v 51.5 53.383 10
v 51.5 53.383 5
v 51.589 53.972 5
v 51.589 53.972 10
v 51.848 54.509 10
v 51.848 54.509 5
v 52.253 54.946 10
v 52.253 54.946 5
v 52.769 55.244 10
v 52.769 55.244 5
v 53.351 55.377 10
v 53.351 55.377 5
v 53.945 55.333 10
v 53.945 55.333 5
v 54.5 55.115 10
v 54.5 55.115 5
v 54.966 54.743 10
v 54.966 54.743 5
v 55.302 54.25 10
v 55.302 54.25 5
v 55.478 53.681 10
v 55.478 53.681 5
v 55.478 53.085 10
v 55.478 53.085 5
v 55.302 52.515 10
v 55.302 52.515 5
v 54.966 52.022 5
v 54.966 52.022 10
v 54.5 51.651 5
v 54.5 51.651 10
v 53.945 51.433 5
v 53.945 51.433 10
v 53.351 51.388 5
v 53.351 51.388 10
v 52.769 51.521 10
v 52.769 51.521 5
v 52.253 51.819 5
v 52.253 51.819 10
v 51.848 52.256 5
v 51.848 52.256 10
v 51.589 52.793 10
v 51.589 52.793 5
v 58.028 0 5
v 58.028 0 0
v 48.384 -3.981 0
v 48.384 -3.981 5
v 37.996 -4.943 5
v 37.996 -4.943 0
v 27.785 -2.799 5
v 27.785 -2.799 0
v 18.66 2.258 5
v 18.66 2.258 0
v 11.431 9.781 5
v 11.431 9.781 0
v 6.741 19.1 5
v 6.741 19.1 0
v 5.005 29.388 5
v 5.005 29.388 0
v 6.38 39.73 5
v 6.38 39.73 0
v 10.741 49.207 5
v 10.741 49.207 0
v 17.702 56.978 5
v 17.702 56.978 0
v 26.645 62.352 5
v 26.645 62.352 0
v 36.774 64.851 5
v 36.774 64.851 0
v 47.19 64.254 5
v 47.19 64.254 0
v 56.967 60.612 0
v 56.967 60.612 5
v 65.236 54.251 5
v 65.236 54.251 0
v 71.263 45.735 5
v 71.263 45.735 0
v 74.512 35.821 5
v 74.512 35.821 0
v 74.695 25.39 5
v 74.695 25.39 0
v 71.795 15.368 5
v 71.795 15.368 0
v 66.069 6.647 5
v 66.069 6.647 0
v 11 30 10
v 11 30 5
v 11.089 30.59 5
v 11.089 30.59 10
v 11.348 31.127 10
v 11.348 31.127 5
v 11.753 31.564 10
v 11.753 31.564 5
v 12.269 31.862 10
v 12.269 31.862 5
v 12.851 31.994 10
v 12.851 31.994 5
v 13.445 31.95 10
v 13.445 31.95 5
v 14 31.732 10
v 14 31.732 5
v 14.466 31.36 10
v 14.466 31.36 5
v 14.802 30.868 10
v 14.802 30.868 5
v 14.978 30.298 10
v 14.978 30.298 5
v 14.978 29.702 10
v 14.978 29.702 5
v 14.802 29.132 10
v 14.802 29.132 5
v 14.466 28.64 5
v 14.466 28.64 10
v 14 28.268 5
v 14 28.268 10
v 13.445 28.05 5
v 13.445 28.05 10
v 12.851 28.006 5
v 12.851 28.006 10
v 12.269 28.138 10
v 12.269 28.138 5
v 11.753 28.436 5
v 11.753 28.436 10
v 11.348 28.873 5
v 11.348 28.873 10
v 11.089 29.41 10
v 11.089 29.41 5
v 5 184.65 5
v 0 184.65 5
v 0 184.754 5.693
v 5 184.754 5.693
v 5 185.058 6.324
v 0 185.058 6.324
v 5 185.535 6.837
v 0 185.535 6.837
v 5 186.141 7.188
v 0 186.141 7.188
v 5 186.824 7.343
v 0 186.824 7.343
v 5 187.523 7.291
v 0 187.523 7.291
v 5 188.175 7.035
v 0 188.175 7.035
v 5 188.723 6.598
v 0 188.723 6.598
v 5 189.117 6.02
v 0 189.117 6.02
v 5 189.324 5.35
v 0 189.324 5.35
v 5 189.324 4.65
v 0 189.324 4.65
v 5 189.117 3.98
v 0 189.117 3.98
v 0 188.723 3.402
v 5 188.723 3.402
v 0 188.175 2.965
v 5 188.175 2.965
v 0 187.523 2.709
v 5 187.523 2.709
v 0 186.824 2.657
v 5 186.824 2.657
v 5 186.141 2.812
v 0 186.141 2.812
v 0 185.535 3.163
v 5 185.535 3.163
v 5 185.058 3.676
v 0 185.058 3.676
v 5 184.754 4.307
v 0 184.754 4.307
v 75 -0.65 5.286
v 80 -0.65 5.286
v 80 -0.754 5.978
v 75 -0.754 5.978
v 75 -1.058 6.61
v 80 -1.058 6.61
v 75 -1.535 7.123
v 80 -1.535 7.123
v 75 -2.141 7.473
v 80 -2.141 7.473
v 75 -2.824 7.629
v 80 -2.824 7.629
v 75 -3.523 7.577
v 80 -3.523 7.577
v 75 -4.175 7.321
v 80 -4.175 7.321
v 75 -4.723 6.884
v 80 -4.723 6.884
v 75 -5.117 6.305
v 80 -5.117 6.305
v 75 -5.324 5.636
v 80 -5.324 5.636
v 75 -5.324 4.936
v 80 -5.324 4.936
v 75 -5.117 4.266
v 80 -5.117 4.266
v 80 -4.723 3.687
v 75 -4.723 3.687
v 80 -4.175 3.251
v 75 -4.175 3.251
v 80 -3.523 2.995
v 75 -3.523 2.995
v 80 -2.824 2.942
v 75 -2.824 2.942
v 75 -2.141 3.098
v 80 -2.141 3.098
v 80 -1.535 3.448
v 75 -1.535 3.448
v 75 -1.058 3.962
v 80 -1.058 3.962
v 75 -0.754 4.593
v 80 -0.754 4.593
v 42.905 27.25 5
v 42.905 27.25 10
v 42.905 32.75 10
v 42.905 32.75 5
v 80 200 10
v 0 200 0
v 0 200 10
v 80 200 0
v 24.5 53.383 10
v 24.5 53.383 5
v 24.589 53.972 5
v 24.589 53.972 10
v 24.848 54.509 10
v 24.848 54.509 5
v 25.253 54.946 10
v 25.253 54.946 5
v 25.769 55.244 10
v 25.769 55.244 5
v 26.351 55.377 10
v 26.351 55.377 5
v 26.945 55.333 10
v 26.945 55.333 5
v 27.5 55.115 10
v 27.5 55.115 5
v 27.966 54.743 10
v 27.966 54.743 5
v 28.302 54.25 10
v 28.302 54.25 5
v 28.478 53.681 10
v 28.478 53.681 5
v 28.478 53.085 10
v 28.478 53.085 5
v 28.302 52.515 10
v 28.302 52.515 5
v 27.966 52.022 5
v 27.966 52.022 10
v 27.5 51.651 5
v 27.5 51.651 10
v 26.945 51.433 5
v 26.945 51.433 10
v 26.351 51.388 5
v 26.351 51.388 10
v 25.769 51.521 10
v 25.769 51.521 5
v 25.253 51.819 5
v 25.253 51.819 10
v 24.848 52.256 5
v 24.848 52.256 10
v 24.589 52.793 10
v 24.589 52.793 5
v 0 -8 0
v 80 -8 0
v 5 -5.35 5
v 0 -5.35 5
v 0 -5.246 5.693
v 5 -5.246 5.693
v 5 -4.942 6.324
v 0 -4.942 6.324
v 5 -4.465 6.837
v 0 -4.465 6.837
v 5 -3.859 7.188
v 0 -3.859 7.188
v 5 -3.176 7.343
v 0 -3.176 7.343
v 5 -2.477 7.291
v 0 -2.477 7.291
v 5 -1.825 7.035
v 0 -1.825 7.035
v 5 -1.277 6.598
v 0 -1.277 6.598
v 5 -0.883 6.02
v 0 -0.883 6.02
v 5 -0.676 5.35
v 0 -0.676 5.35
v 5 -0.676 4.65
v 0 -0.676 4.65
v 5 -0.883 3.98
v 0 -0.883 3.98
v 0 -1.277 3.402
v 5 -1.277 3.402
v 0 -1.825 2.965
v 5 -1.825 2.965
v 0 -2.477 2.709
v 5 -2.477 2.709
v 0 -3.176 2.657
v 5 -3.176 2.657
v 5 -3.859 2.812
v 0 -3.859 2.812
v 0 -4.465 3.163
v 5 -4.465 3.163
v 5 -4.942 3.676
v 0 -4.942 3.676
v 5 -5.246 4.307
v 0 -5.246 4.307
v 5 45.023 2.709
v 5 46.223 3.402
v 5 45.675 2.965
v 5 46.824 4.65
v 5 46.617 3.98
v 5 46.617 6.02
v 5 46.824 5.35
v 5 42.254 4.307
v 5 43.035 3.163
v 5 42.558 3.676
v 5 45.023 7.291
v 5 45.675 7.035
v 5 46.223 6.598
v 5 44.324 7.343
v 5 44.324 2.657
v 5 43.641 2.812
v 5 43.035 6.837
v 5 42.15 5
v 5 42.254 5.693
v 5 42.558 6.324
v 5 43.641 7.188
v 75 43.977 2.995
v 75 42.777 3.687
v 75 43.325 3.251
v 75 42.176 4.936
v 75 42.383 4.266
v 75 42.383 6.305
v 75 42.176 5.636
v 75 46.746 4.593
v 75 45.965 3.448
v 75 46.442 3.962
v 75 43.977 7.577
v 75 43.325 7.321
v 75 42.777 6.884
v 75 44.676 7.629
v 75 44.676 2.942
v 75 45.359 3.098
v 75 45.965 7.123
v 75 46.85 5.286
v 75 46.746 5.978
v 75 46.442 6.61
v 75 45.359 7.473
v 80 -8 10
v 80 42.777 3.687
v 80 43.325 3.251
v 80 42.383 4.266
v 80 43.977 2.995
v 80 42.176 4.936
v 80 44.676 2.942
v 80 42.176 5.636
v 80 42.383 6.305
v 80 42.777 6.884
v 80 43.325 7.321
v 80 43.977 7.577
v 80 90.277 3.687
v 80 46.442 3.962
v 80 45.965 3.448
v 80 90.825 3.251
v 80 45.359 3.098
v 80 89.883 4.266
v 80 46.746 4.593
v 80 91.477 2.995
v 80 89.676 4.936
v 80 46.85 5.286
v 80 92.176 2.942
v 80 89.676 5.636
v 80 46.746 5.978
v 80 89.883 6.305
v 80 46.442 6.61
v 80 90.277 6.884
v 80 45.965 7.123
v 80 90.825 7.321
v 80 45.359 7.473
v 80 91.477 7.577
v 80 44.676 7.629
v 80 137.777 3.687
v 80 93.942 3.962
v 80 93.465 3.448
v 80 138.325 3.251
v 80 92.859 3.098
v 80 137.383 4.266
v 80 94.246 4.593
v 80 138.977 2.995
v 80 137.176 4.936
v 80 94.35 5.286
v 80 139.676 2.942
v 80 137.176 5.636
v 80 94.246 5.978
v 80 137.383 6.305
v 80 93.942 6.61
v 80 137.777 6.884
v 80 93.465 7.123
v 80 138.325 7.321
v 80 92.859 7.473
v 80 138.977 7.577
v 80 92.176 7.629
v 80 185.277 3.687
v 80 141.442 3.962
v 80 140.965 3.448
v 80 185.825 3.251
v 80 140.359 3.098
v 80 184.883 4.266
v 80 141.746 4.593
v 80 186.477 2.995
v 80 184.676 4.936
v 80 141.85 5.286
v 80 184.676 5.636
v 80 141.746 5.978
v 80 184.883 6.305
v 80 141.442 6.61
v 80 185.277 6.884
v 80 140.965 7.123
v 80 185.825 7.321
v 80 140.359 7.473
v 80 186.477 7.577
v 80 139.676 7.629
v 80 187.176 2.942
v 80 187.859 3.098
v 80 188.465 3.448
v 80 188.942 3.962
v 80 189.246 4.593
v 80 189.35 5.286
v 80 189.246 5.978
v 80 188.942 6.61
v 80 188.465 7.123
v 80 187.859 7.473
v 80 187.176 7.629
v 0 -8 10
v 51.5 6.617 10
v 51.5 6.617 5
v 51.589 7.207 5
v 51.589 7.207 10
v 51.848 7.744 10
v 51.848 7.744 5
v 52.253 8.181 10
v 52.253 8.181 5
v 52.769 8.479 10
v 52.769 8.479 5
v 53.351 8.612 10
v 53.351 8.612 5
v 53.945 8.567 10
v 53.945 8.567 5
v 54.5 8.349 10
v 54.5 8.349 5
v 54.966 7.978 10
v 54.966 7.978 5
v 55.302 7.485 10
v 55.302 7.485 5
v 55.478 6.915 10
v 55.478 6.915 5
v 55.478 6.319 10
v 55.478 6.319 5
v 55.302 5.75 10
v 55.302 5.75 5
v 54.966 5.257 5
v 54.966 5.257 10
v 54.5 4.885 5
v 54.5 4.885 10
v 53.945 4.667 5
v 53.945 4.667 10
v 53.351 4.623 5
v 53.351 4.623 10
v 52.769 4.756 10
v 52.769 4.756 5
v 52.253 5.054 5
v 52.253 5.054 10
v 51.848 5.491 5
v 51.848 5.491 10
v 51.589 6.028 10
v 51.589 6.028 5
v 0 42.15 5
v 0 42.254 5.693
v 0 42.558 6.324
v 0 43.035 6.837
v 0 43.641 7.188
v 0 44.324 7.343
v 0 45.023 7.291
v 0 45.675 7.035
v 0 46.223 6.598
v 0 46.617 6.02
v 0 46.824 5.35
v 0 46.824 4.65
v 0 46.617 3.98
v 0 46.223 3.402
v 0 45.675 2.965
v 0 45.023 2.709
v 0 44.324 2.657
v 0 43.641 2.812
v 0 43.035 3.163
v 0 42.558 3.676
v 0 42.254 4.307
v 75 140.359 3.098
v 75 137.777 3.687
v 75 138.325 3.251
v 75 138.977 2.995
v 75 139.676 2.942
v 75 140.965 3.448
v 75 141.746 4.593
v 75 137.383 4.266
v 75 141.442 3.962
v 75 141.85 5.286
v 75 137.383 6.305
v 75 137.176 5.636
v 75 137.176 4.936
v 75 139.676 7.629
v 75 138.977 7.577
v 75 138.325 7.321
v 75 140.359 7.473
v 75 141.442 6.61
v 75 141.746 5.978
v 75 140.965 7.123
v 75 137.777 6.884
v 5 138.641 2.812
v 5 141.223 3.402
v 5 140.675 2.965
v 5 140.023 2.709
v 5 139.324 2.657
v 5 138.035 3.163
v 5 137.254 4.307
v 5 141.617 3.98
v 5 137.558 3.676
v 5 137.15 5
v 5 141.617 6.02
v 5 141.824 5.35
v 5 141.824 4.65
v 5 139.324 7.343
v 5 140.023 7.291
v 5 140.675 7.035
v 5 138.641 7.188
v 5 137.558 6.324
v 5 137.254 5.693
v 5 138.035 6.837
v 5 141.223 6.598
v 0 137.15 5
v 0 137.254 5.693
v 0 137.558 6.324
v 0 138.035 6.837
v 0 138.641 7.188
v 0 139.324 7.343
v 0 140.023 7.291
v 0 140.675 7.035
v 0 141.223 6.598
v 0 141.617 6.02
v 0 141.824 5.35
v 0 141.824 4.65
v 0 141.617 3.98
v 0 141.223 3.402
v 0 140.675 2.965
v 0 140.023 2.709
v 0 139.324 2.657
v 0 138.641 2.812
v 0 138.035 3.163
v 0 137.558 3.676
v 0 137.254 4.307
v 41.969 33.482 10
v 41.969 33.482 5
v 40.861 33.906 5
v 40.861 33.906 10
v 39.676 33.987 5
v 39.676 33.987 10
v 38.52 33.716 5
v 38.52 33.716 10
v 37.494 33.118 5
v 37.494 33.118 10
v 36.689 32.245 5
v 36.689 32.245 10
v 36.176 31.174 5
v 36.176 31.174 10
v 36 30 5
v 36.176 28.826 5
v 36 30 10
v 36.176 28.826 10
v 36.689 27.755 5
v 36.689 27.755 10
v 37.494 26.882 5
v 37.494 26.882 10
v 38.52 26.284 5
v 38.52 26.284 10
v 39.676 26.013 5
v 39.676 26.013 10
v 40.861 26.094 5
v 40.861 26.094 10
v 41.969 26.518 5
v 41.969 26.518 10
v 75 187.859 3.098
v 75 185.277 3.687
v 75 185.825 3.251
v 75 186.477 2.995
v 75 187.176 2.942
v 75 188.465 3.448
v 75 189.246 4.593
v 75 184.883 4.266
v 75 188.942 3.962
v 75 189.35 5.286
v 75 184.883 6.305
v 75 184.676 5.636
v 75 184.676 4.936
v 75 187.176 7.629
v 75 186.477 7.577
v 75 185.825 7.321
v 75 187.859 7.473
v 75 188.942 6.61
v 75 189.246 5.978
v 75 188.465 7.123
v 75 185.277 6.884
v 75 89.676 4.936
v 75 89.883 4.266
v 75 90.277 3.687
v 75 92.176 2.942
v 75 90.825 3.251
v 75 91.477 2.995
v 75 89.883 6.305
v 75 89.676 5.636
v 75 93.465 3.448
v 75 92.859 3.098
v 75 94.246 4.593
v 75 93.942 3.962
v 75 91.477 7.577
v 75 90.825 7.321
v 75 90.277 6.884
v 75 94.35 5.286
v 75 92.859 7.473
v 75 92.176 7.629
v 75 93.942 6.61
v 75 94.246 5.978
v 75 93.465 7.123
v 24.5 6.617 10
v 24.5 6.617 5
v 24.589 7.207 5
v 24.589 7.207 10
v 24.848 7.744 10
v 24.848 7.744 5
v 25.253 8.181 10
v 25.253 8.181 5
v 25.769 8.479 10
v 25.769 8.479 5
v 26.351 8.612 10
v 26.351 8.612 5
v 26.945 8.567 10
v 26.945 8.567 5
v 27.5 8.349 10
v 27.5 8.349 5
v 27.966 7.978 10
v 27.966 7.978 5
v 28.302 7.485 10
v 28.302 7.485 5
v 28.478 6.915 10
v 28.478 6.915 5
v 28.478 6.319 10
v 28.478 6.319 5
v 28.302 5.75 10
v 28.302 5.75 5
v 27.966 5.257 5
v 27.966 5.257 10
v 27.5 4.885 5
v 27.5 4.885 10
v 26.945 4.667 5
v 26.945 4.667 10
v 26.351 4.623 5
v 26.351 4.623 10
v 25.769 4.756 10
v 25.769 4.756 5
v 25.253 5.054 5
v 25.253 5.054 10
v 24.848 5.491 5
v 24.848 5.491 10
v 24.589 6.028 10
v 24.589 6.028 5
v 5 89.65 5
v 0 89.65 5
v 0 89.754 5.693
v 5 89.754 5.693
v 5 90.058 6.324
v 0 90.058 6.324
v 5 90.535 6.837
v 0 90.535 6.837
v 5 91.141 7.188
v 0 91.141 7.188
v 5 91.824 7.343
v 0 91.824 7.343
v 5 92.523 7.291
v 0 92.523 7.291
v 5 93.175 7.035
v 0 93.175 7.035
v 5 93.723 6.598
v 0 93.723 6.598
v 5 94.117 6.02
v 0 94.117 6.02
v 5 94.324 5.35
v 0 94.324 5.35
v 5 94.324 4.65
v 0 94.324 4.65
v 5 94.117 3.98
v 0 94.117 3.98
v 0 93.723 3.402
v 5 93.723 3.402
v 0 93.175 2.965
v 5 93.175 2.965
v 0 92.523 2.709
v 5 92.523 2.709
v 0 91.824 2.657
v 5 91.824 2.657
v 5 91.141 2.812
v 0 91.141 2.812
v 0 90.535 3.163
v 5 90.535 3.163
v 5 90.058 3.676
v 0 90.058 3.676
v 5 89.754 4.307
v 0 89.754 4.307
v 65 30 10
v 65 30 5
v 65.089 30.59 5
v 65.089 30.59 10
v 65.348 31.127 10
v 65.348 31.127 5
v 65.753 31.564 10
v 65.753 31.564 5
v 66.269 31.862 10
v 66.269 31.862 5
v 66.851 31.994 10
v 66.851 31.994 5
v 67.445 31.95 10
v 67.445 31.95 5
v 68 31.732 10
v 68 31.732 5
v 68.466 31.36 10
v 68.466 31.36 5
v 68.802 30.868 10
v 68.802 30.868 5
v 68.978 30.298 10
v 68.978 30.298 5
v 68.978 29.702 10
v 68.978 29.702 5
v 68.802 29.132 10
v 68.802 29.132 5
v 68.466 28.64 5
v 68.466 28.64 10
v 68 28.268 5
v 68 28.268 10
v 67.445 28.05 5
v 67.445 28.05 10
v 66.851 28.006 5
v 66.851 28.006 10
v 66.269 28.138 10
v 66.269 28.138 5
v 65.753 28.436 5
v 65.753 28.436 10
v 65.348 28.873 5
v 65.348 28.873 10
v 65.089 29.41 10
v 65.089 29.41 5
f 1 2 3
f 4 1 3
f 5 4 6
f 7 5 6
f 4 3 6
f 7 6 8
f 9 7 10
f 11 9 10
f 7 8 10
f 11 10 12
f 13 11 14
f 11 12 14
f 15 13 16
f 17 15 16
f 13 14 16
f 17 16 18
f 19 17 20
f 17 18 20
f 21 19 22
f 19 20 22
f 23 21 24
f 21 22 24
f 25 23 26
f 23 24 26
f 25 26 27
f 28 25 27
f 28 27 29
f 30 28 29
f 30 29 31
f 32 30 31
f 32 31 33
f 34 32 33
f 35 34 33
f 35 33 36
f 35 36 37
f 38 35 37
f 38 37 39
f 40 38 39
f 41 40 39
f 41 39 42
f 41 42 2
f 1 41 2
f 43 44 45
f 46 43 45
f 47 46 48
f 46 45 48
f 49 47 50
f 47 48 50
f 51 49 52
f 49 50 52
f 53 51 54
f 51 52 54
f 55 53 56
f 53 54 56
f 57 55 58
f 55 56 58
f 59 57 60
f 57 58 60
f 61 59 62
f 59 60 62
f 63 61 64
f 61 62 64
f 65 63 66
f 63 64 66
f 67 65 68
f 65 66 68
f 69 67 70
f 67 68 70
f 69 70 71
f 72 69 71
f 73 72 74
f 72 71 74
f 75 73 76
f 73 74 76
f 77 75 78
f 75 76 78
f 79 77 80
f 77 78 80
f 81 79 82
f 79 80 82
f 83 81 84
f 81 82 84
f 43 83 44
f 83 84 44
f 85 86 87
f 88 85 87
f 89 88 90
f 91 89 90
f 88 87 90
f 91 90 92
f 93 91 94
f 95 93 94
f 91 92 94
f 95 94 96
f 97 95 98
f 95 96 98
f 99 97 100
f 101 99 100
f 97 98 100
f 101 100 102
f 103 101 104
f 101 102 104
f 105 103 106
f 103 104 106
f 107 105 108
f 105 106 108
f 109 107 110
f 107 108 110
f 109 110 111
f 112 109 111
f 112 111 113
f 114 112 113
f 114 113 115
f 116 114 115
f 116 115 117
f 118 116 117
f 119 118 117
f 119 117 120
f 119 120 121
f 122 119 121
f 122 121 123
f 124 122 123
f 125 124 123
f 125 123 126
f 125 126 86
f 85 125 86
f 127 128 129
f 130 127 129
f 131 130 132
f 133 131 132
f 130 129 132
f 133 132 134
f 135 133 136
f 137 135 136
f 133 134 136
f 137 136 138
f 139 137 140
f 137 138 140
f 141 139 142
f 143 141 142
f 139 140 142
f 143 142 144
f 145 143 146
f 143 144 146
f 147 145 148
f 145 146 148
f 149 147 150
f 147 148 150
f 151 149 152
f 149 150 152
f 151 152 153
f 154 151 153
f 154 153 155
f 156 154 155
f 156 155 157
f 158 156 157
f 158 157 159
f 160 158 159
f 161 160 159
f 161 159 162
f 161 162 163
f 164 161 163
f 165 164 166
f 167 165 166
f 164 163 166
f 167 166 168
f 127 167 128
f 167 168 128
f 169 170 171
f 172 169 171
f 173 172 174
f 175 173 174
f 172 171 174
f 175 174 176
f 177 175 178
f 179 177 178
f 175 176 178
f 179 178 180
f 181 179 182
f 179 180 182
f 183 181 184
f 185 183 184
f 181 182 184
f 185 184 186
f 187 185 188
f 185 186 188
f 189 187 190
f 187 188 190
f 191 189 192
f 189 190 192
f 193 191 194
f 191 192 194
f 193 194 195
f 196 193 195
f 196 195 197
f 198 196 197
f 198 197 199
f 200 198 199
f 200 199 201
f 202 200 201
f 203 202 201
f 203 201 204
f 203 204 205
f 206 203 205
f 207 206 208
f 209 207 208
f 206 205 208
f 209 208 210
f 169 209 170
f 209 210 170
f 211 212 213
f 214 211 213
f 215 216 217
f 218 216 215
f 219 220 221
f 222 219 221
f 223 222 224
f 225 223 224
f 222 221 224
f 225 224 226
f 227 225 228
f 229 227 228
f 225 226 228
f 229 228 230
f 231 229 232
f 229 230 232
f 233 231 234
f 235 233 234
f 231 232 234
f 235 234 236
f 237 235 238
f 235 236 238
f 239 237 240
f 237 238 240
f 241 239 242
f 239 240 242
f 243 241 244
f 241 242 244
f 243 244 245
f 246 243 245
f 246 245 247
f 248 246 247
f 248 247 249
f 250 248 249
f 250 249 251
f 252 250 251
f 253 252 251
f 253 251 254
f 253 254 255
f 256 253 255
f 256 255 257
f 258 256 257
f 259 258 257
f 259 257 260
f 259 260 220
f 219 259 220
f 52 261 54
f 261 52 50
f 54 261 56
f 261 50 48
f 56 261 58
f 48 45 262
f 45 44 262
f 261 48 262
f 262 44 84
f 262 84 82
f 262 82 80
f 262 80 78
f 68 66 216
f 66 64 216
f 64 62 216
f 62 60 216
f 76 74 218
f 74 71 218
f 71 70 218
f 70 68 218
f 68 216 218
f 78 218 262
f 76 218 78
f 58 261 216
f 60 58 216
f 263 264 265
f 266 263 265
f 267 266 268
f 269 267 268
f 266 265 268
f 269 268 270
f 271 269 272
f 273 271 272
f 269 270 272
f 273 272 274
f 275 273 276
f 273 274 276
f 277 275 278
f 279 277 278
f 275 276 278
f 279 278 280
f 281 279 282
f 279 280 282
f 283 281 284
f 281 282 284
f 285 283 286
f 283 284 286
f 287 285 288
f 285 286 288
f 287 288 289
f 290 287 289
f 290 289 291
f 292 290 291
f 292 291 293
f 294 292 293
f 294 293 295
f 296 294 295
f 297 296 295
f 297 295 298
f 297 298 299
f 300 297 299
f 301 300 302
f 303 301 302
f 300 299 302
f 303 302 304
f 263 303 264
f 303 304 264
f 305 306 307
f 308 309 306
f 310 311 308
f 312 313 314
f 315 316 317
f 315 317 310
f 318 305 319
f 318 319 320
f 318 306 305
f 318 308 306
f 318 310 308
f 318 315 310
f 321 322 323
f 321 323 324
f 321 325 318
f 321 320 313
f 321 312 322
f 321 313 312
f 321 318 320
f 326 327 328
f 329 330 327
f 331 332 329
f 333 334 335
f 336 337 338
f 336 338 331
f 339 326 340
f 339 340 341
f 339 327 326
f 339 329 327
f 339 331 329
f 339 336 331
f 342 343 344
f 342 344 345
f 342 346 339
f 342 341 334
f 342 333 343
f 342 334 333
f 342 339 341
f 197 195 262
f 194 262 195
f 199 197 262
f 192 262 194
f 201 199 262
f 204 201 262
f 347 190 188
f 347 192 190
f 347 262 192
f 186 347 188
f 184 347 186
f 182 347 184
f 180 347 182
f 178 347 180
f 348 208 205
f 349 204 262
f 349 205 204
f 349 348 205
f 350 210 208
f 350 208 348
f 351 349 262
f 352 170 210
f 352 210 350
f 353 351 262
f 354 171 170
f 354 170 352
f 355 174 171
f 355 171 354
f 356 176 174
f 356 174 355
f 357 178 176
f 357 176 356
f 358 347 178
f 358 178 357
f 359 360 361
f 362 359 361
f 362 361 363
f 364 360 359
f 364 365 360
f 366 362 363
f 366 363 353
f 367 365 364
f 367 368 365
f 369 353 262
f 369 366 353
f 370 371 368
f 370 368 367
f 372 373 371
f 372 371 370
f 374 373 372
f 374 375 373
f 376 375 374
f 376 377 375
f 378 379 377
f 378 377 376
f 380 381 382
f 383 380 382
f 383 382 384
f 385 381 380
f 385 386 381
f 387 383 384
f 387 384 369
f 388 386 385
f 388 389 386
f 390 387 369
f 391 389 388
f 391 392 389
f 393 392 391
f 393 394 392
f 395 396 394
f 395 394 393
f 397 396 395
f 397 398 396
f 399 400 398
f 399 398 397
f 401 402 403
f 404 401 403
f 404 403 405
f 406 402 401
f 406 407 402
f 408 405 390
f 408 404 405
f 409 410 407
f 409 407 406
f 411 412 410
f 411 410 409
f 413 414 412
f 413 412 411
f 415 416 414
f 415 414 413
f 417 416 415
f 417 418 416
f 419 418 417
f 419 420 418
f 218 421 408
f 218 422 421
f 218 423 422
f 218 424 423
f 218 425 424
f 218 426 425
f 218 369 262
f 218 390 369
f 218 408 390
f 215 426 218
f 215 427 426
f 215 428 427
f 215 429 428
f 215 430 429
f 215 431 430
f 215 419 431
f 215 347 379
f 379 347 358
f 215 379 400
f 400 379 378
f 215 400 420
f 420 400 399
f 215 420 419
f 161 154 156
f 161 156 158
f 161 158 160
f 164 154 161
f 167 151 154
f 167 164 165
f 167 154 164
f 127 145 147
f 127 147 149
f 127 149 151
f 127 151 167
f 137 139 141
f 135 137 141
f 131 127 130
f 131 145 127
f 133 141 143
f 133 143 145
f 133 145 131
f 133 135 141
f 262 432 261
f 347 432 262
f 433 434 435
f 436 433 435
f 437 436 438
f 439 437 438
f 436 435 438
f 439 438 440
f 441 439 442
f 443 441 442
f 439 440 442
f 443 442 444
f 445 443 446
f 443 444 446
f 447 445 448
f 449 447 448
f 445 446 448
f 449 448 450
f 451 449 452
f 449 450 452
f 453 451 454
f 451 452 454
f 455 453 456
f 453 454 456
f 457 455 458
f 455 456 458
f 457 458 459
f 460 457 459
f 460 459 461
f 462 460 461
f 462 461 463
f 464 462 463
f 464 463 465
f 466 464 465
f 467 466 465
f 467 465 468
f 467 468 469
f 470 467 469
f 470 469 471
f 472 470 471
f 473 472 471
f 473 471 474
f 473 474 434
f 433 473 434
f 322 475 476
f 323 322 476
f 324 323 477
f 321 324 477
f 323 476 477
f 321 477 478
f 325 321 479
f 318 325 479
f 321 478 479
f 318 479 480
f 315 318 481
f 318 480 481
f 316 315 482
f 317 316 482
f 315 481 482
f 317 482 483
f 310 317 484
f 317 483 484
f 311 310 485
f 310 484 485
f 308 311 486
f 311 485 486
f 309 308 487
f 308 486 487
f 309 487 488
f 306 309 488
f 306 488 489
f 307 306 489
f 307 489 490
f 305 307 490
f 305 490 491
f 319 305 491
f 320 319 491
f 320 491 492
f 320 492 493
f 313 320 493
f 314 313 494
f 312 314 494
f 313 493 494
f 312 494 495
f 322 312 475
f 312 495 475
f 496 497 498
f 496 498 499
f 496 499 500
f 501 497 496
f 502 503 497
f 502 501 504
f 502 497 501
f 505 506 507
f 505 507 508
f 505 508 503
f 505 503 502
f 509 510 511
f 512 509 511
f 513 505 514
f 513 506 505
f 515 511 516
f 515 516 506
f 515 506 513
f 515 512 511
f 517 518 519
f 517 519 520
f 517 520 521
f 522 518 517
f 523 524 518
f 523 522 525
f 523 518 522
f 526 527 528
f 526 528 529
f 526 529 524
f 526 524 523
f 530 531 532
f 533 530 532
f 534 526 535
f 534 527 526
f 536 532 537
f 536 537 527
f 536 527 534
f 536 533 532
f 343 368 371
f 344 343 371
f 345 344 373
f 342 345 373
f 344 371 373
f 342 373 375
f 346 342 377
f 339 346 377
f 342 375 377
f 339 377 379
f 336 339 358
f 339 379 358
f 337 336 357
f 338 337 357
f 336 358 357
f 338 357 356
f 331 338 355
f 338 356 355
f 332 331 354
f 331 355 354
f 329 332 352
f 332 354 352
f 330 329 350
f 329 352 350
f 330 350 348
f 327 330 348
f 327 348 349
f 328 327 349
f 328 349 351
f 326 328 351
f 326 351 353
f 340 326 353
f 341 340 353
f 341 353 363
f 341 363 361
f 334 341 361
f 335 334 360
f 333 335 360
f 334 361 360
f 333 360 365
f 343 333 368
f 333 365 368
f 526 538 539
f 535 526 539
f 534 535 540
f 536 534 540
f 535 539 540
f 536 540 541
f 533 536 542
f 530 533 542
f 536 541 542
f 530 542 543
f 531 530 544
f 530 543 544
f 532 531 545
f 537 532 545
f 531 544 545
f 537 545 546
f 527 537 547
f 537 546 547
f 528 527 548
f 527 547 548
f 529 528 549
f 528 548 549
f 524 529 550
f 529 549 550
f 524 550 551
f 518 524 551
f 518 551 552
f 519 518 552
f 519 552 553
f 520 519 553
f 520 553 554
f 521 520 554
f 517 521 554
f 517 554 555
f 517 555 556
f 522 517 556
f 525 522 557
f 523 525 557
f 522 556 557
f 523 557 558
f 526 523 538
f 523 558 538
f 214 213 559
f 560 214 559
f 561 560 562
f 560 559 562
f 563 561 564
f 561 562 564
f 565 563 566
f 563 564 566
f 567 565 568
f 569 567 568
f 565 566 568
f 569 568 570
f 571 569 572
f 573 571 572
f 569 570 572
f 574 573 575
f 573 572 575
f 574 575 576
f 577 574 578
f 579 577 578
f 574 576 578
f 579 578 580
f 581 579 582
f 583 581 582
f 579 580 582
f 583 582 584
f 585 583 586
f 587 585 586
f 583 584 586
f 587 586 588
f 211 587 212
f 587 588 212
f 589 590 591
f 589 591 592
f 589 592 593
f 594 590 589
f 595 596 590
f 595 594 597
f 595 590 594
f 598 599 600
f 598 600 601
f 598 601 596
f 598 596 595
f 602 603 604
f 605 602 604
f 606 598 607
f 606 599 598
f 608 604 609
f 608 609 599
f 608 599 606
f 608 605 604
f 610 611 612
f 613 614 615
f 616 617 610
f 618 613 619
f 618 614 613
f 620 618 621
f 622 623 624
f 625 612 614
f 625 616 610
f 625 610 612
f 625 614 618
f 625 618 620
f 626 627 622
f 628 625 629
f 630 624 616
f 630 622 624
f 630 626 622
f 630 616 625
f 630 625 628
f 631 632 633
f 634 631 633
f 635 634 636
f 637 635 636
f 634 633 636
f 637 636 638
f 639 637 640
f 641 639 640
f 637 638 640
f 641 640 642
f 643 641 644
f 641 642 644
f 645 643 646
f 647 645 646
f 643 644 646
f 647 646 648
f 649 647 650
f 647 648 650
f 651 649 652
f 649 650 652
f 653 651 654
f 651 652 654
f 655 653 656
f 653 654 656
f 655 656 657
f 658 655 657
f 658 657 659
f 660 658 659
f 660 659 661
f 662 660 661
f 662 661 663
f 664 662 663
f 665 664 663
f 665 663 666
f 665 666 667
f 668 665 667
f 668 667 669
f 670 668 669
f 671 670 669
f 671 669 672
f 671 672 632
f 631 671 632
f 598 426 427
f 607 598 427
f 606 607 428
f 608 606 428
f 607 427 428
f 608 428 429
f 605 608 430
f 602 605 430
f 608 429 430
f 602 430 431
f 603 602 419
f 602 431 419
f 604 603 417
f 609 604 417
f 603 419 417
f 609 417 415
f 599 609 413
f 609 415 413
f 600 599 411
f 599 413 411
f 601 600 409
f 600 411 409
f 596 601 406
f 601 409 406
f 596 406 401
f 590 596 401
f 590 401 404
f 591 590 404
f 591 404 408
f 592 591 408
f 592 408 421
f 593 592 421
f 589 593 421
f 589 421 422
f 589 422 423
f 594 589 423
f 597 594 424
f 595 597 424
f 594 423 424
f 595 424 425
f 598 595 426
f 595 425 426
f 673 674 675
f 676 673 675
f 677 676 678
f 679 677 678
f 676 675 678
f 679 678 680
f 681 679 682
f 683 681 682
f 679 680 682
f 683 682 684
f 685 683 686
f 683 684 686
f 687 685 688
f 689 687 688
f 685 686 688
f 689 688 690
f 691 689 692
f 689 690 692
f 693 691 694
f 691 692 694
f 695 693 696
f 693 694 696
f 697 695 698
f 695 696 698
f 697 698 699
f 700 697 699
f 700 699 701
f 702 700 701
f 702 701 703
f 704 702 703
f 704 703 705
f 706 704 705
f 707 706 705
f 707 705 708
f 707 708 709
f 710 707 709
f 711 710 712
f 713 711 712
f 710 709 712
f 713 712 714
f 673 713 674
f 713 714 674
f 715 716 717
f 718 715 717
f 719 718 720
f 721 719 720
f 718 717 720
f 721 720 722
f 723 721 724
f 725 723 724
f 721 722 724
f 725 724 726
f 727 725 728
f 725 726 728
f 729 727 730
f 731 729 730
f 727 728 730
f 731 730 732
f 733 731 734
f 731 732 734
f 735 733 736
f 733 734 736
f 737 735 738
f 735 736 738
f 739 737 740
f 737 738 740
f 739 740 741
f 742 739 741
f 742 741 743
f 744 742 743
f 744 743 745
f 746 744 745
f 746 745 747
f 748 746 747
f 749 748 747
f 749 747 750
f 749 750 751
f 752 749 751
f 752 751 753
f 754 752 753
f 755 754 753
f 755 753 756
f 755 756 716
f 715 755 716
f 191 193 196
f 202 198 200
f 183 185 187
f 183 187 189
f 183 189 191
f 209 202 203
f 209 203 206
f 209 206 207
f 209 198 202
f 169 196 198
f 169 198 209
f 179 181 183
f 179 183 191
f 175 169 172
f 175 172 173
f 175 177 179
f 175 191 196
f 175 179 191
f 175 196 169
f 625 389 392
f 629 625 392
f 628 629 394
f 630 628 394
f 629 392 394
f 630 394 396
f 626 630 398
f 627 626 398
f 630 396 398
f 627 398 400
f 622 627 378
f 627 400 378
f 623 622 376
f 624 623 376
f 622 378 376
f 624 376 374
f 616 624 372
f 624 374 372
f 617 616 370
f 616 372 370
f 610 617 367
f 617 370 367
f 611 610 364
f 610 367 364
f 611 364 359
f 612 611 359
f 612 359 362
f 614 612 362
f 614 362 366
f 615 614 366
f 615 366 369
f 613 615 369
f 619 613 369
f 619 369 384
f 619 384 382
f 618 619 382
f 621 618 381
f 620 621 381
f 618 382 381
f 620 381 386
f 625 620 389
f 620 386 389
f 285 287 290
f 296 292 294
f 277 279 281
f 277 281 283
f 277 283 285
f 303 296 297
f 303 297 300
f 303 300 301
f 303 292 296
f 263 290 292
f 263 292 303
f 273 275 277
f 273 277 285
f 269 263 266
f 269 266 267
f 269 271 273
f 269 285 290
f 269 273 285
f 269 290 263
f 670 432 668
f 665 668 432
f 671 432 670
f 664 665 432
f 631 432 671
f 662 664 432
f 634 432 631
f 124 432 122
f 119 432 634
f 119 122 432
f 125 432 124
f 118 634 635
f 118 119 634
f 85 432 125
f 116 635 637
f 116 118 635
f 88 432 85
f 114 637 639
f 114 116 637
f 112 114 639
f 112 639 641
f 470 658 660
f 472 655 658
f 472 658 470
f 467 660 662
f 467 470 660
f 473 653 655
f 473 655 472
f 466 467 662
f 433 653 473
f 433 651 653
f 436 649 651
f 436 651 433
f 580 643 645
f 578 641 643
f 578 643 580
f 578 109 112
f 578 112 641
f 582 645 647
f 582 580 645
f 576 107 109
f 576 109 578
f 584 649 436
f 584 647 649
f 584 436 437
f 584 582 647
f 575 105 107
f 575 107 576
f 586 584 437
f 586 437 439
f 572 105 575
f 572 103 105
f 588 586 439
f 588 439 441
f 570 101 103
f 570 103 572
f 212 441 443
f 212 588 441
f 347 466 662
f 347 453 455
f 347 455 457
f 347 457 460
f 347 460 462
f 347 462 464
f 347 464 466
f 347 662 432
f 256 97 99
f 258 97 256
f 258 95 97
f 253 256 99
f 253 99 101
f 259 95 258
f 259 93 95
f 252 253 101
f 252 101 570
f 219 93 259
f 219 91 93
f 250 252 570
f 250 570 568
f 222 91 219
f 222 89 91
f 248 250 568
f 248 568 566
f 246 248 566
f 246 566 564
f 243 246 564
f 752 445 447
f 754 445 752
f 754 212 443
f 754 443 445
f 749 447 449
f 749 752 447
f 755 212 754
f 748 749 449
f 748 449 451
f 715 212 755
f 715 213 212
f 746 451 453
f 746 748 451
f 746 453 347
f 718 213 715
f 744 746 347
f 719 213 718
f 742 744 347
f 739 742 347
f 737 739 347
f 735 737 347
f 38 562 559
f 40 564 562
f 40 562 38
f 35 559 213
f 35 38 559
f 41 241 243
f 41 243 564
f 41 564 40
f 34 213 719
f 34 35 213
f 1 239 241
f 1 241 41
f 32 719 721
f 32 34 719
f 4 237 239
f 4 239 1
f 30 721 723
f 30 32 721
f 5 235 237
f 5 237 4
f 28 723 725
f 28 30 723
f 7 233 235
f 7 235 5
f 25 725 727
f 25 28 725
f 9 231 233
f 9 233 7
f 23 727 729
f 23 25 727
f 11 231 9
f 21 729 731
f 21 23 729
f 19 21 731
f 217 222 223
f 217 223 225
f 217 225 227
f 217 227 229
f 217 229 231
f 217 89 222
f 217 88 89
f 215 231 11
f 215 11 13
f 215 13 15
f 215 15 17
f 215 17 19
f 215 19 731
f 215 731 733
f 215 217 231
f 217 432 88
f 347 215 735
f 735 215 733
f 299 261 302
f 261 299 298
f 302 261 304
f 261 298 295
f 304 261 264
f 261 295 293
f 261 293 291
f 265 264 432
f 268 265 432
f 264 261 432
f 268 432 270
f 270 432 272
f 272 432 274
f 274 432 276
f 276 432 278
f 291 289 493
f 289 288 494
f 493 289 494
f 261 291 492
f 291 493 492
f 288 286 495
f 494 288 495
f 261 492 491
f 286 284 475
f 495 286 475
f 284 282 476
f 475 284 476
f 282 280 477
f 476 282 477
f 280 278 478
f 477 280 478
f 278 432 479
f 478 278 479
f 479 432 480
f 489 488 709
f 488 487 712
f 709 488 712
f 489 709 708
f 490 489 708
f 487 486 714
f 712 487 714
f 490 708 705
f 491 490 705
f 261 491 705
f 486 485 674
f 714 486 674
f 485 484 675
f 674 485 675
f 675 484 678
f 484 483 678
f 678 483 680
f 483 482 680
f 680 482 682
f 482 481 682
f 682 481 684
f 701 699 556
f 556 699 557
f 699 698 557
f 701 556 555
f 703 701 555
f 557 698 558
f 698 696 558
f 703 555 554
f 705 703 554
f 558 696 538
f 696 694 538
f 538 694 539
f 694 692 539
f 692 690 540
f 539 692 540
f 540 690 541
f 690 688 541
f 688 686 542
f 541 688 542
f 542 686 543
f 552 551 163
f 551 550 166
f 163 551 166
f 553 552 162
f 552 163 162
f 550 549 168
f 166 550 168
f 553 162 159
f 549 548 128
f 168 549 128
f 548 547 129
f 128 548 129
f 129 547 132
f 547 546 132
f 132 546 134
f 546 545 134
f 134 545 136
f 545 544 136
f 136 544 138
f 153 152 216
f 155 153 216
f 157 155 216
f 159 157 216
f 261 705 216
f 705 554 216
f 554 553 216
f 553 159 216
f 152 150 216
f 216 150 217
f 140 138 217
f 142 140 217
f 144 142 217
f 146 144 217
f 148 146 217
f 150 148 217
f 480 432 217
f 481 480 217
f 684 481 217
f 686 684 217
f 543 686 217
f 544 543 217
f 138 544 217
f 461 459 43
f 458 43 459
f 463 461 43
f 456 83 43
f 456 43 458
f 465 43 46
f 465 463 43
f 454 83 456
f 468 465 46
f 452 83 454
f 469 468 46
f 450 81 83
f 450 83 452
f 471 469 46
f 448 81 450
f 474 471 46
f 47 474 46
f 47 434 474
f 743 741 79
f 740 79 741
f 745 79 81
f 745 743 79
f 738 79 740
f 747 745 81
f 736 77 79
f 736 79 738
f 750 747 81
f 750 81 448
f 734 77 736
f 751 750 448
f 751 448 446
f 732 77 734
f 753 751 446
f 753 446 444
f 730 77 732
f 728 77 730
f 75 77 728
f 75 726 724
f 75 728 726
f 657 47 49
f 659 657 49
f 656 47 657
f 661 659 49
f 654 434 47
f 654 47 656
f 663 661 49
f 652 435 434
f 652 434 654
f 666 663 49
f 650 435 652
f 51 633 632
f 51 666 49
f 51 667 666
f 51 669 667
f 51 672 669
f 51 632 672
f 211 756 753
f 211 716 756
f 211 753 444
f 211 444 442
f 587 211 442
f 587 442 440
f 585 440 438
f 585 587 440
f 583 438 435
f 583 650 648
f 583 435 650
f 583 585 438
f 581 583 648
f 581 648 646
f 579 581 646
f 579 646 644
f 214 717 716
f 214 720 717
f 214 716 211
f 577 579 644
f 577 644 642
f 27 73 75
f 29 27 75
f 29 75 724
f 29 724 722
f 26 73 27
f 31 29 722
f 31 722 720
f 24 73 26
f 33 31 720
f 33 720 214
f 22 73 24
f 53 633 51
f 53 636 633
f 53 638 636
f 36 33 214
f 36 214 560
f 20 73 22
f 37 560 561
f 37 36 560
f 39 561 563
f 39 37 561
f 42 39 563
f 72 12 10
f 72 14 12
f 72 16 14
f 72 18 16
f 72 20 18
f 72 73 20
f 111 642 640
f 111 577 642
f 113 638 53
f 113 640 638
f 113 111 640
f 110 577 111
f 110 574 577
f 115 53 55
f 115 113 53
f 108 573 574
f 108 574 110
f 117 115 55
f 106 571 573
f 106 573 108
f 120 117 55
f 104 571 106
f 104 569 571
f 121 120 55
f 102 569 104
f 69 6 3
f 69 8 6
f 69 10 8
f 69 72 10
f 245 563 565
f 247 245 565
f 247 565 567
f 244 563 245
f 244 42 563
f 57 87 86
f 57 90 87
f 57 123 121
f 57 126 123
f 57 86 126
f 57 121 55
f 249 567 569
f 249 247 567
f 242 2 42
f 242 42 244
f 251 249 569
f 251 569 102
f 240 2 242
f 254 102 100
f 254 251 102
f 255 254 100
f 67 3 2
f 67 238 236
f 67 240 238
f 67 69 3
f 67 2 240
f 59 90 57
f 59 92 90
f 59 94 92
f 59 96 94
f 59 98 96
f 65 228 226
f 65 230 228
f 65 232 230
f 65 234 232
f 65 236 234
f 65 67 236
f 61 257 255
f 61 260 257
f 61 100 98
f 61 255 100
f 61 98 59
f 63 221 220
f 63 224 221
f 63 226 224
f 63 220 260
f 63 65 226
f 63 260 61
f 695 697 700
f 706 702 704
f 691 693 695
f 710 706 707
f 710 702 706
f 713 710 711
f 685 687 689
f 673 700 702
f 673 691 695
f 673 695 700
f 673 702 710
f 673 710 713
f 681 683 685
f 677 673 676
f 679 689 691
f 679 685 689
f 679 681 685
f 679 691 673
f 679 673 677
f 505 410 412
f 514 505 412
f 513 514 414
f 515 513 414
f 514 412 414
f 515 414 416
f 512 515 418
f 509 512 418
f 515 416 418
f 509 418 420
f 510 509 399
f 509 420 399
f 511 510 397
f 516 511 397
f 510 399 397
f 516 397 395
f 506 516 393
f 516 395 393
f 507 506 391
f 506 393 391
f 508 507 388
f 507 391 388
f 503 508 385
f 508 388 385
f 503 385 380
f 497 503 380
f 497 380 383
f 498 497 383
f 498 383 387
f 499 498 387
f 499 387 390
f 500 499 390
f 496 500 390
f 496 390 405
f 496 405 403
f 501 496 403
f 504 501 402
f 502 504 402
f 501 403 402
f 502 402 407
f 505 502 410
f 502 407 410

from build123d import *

# Parameters (mm, degrees)
CROQUIS1_W              = 80
CROQUIS1_H              = 200
SALIENTE_EXTRUIR1_DEPTH = 10
CORTAR_EXTRUIR1_DEPTH   = 10
CROQUIS5_R              = 2
CORTAR_EXTRUIR4_DEPTH   = 216.638586528
CROQUIS6_R              = 35
CORTAR_EXTRUIR5_DEPTH   = 5
CROQUIS7_W              = 80
CROQUIS7_H              = 8
SALIENTE_EXTRUIR2_DEPTH = 10
CROQUIS9_R              = 35
CORTAR_EXTRUIR7_DEPTH   = 5
CROQUIS11_R             = 2.35
CORTAR_EXTRUIR8_DEPTH   = 5
CROQUIS12_R             = 2.35
CORTAR_EXTRUIR9_DEPTH   = 5


with BuildPart() as part:
    # Croquis1 → Saliente-Extruir1 (new body)
    with BuildSketch(Plane.XY):
        with Locations((40, 100)):
            Rectangle(CROQUIS1_W, CROQUIS1_H)
    extrude(amount=SALIENTE_EXTRUIR1_DEPTH)

    # Croquis2 → Cortar-Extruir1 (cut)
    with BuildSketch(Plane.XY.offset(10)):
        with BuildLine():
            Line((42.90473751, 27.25), (42.90473751, 32.75))
            ThreePointArc((42.90473751, 32.75), (36, 30), (42.90473751, 27.25))
        make_face()
    extrude(amount=-CORTAR_EXTRUIR1_DEPTH, mode=Mode.SUBTRACT)

    # Croquis5 → Cortar-Extruir4 (cut, through all)
    with BuildSketch(Plane(origin=(0, 0, 0), x_dir=(-1, 0, 0), z_dir=(0, 0, -1))):
        with Locations((-13, 30)):
            Circle(CROQUIS5_R)
        with Locations((-26.5, 6.617314098)):
            Circle(CROQUIS5_R)
        with Locations((-53.5, 6.617314098)):
            Circle(CROQUIS5_R)
        with Locations((-67, 30)):
            Circle(CROQUIS5_R)
        with Locations((-53.5, 53.382685902)):
            Circle(CROQUIS5_R)
        with Locations((-26.5, 53.382685902)):
            Circle(CROQUIS5_R)
    extrude(amount=-CORTAR_EXTRUIR4_DEPTH, mode=Mode.SUBTRACT)

    # Croquis6 → Cortar-Extruir5 (cut)
    with BuildSketch(Plane(origin=(0, 0, 0), x_dir=(-1, 0, 0), z_dir=(0, 0, -1))):
        with Locations((-40, 30)):
            Circle(CROQUIS6_R)
    extrude(amount=-CORTAR_EXTRUIR5_DEPTH, mode=Mode.SUBTRACT)

    # Croquis7 → Saliente-Extruir2 (add)
    with BuildSketch(Plane.XY.offset(10)):
        with Locations((40, -4)):
            Rectangle(CROQUIS7_W, CROQUIS7_H)
    extrude(amount=-SALIENTE_EXTRUIR2_DEPTH)

    # Croquis9 → Cortar-Extruir7 (cut)
    with BuildSketch(Plane(origin=(0, 0, 0), x_dir=(-1, 0, 0), z_dir=(0, 0, -1))):
        with Locations((-40, 30)):
            Circle(CROQUIS9_R)
    extrude(amount=-CORTAR_EXTRUIR7_DEPTH, mode=Mode.SUBTRACT)

    # Croquis11 → Cortar-Extruir8 (cut)
    with BuildSketch(Plane.ZY):
        with Locations(Location((5, 187, 0), (0, 0, 270))):
            Circle(CROQUIS11_R)
        with Locations(Location((5, 139.5, 0), (0, 0, 270))):
            Circle(CROQUIS11_R)
        with Locations(Location((5, 92, 0), (0, 0, 270))):
            Circle(CROQUIS11_R)
        with Locations(Location((5, 44.5, 0), (0, 0, 270))):
            Circle(CROQUIS11_R)
        with Locations(Location((5, -3, 0), (0, 0, 270))):
            Circle(CROQUIS11_R)
    extrude(amount=-CORTAR_EXTRUIR8_DEPTH, mode=Mode.SUBTRACT)

    # Croquis12 → Cortar-Extruir9 (cut)
    with BuildSketch(Plane(origin=(80, 0, 0), x_dir=(0, 0, -1), z_dir=(1, 0, 0))):
        with Locations(Location((-5.28576423, 187, 0), (0, 0, 90))):
            Circle(CROQUIS12_R)
        with Locations(Location((-5.28576423, 139.5, 0), (0, 0, 90))):
            Circle(CROQUIS12_R)
        with Locations(Location((-5.28576423, 92, 0), (0, 0, 90))):
            Circle(CROQUIS12_R)
        with Locations(Location((-5.28576423, 44.5, 0), (0, 0, 90))):
            Circle(CROQUIS12_R)
        with Locations(Location((-5.28576423, -3, 0), (0, 0, 90))):
            Circle(CROQUIS12_R)
    extrude(amount=-CORTAR_EXTRUIR9_DEPTH, mode=Mode.SUBTRACT)


solid = part.part
